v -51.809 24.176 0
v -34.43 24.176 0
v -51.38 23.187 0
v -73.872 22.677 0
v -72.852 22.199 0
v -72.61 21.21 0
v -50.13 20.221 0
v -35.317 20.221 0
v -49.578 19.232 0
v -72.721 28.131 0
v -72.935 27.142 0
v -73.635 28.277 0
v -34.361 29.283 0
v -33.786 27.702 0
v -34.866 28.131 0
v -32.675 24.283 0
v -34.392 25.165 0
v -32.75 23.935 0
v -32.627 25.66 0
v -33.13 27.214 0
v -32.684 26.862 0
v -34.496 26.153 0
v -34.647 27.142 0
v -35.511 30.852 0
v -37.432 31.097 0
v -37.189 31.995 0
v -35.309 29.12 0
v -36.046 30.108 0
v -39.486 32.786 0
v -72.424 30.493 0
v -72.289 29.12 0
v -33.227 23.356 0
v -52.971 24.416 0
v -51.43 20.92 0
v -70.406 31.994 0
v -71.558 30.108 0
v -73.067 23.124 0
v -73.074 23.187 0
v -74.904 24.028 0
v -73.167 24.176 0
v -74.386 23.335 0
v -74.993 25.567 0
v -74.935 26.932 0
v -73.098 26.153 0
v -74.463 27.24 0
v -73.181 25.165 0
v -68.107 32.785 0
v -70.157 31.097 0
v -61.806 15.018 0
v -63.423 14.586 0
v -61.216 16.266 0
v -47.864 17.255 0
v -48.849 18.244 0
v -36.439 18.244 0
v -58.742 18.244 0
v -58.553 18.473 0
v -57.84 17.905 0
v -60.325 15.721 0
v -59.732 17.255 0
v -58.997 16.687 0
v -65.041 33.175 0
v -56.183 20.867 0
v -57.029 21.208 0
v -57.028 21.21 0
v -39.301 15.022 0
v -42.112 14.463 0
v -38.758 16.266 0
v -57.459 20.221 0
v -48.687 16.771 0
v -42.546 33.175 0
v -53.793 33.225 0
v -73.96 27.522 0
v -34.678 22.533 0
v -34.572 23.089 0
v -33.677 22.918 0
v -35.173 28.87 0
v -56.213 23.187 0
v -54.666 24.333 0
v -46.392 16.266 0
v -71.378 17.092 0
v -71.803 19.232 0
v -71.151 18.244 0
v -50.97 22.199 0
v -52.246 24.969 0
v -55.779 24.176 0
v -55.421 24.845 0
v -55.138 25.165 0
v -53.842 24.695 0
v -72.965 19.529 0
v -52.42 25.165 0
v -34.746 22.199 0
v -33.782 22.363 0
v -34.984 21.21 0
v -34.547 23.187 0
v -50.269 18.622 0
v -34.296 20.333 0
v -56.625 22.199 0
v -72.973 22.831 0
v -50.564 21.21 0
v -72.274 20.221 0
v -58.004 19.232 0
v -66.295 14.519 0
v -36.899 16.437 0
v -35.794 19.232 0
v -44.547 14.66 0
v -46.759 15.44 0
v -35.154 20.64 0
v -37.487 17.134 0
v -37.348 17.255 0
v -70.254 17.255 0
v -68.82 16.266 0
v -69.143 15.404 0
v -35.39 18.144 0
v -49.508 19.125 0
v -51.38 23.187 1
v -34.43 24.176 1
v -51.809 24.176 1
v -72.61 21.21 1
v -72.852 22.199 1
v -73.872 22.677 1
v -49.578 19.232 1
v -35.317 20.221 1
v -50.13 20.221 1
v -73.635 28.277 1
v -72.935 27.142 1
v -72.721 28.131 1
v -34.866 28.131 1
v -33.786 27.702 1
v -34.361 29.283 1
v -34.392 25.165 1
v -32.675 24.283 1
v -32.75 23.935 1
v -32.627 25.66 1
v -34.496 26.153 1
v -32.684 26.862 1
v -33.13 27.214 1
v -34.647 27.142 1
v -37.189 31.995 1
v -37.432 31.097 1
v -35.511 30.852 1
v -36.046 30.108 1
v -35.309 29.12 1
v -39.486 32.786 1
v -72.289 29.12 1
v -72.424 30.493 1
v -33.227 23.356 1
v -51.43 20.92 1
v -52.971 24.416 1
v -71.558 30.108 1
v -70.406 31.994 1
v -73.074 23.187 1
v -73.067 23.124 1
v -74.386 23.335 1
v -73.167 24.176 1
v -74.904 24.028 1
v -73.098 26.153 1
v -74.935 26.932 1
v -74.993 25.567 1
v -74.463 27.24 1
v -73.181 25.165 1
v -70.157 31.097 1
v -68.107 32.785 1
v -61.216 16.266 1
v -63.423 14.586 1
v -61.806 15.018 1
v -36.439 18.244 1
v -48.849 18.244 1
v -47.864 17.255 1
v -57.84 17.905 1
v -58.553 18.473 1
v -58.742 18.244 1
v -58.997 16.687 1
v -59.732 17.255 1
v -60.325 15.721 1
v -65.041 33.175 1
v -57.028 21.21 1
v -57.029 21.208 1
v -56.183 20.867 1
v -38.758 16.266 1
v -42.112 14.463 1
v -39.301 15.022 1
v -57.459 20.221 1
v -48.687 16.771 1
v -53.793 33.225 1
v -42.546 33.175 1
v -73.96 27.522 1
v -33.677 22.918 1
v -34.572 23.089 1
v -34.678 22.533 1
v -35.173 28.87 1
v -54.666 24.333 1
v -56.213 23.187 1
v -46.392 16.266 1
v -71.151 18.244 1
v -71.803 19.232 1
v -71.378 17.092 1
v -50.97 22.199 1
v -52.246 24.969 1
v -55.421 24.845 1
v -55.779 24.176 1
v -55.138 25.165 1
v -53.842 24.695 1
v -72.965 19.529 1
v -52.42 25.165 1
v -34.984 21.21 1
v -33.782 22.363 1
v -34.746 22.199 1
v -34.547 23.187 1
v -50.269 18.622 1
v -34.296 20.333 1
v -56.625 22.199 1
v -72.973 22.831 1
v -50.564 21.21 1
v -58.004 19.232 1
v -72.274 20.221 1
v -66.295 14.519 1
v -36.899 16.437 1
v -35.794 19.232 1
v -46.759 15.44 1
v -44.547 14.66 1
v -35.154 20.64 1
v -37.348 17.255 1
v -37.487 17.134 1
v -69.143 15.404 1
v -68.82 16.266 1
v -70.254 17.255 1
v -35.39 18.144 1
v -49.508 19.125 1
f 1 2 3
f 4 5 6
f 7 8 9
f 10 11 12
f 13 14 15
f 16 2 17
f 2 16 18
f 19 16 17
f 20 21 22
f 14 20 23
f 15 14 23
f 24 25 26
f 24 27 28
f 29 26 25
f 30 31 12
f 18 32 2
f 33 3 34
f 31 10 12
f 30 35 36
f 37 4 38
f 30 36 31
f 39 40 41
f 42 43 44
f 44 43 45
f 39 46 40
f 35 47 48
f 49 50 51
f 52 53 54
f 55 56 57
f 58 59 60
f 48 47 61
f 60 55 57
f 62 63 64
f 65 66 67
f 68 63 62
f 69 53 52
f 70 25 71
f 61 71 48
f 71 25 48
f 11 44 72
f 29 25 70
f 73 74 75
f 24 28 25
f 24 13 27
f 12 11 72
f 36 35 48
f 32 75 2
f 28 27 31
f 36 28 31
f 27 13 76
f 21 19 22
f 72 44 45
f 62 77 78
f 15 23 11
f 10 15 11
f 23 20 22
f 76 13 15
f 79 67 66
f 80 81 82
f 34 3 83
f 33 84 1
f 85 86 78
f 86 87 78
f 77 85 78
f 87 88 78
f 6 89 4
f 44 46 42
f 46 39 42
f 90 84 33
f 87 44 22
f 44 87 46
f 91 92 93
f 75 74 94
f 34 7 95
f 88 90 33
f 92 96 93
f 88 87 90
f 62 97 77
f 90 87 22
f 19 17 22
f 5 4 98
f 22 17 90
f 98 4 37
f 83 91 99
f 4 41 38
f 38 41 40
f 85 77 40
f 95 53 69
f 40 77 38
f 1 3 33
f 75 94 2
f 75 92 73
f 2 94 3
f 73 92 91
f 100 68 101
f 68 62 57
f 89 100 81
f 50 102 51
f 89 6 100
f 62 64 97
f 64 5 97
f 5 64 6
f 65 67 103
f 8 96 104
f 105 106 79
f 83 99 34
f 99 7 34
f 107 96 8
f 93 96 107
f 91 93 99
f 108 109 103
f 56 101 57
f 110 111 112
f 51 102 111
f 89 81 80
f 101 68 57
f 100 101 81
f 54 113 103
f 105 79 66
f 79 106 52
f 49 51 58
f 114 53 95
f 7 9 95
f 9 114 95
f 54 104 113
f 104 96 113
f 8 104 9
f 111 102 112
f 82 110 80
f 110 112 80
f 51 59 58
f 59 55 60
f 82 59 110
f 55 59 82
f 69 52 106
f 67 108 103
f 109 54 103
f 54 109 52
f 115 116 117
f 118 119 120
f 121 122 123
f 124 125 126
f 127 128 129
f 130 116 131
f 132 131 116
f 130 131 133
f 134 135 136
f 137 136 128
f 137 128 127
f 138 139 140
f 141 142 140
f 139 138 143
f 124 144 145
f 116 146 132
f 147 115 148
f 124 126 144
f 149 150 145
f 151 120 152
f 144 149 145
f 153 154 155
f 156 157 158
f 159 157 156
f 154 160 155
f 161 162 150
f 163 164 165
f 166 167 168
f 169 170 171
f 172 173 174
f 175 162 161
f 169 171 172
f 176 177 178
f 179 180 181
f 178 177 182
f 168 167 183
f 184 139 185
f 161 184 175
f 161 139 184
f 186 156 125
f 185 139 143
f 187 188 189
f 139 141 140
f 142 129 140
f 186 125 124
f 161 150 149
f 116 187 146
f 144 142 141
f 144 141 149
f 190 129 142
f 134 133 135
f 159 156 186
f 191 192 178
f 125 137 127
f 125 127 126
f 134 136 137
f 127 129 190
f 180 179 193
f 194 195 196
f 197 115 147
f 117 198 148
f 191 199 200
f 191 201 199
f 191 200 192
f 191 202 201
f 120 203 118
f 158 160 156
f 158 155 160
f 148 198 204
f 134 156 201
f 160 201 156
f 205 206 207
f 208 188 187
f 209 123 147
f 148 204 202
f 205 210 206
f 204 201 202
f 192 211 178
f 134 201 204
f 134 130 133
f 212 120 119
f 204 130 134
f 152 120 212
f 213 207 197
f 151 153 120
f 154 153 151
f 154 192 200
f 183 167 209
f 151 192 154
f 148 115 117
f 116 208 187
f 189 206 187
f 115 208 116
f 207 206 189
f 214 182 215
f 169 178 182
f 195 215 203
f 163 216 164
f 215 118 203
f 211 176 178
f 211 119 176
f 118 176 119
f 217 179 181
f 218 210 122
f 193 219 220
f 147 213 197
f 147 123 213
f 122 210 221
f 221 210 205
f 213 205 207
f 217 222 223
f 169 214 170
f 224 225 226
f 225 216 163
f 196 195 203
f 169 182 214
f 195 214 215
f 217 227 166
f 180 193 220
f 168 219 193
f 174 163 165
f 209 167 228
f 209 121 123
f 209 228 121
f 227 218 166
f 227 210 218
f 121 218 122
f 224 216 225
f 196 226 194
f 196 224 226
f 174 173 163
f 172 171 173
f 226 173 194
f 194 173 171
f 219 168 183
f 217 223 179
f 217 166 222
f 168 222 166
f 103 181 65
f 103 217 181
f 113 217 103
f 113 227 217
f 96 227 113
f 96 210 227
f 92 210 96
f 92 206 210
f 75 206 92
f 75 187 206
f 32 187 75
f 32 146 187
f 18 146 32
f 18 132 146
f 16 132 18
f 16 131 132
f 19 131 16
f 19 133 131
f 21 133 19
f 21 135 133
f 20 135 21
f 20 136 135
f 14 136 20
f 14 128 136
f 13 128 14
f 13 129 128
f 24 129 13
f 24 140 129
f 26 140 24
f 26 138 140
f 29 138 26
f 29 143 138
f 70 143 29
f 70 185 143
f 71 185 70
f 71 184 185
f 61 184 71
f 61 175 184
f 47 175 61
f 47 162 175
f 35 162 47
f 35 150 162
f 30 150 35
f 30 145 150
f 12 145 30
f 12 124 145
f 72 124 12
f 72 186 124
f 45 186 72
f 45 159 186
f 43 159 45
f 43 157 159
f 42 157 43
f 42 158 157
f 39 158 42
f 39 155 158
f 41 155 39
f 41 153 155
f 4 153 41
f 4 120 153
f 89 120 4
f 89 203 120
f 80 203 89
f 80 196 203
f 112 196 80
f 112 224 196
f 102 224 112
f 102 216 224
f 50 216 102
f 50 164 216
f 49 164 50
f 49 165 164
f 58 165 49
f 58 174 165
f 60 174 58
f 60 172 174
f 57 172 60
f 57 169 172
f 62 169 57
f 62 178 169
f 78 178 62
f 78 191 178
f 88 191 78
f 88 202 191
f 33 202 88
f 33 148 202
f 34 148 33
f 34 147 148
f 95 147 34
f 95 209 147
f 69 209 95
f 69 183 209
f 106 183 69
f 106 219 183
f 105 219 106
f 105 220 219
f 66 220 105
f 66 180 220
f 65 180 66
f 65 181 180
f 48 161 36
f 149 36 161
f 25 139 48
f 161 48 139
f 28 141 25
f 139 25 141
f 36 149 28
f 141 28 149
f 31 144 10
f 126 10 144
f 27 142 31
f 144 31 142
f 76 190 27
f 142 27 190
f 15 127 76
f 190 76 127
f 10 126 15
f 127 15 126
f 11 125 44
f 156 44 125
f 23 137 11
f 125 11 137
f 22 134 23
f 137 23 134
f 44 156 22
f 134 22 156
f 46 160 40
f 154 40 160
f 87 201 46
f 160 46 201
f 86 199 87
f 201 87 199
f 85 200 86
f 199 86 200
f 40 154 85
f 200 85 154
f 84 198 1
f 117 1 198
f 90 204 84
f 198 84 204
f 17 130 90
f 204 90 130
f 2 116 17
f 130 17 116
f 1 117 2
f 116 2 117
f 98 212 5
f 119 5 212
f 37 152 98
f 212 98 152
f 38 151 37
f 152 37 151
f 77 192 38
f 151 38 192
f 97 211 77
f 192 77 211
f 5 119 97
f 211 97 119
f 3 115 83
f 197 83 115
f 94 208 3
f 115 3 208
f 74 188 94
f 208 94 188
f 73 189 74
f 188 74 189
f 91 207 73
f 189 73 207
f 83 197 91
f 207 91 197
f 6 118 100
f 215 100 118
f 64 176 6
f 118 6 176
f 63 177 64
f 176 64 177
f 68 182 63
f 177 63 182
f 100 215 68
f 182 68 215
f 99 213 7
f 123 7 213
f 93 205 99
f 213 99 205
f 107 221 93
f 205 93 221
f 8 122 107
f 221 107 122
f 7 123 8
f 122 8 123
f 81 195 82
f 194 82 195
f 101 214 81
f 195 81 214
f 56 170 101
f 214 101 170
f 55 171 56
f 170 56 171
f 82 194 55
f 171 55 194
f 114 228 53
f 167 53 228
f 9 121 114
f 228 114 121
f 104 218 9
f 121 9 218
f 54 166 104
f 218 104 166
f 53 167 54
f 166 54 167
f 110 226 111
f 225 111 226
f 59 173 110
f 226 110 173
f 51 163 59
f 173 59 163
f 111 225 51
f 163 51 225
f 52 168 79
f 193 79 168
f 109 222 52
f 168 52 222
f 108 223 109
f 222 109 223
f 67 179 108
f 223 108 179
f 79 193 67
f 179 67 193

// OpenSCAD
$fn=100;
color([0.8000, 0.8000, 0.8000, 1.0000]) linear_extrude(1) path37();

module path37()
    polygon(
        points=
            [[-53.793, 33.225], [-65.041, 33.175], [-68.107, 32.785], [-70.406, 31.994], [-72.424, 30.493], [-73.635, 28.277], [-73.96, 27.522], [-74.463, 27.24], [-74.935, 26.932], [-74.993, 25.567], [-74.904, 24.028], [-74.386, 23.335], [-73.872, 22.677], [-72.965, 19.529], [-71.378, 17.092], [-69.143, 15.404], [-66.295, 14.519], [-63.423, 14.586], [-61.806, 15.018], [-60.325, 15.721], [-58.997, 16.687], [-57.84, 17.905], [-56.183, 20.867], [-54.666, 24.333], [-53.842, 24.695], [-52.971, 24.416], [-51.43, 20.92], [-50.269, 18.622], [-48.687, 16.771], [-46.759, 15.44], [-44.547, 14.66], [-42.112, 14.463], [-39.301, 15.022], [-36.899, 16.437], [-35.39, 18.144], [-34.296, 20.333], [-33.782, 22.363], [-33.677, 22.918], [-33.227, 23.356], [-32.75, 23.935], [-32.675, 24.283], [-32.627, 25.66], [-32.684, 26.862], [-33.13, 27.214], [-33.786, 27.702], [-34.361, 29.283], [-35.511, 30.852], [-37.189, 31.995], [-39.486, 32.786], [-42.546, 33.175], [-70.157, 31.097], [-37.432, 31.097], [-36.046, 30.108], [-71.558, 30.108], [-72.289, 29.12], [-35.309, 29.12], [-35.173, 28.87], [-34.866, 28.131], [-72.721, 28.131], [-72.935, 27.142], [-34.647, 27.142], [-34.496, 26.153], [-73.098, 26.153], [-73.181, 25.165], [-55.138, 25.165], [-55.421, 24.845], [-55.779, 24.176], [-73.167, 24.176], [-52.42, 25.165], [-34.392, 25.165], [-34.43, 24.176], [-51.809, 24.176], [-52.246, 24.969], [-52.42, 25.165], [-73.074, 23.187], [-56.213, 23.187], [-56.625, 22.199], [-72.852, 22.199], [-72.973, 22.831], [-73.067, 23.124], [-51.38, 23.187], [-34.547, 23.187], [-34.572, 23.089], [-34.678, 22.533], [-34.746, 22.199], [-50.97, 22.199], [-72.61, 21.21], [-57.028, 21.21], [-57.029, 21.208], [-57.459, 20.221], [-72.274, 20.221], [-72.61, 21.21], [-50.564, 21.21], [-34.984, 21.21], [-35.154, 20.64], [-35.317, 20.221], [-50.13, 20.221], [-71.803, 19.232], [-58.004, 19.232], [-58.553, 18.473], [-58.742, 18.244], [-71.151, 18.244], [-49.578, 19.232], [-35.794, 19.232], [-36.439, 18.244], [-48.849, 18.244], [-49.508, 19.125], [-70.254, 17.255], [-59.732, 17.255], [-61.216, 16.266], [-68.82, 16.266], [-47.864, 17.255], [-37.348, 17.255], [-37.487, 17.134], [-38.758, 16.266], [-46.392, 16.266]],
        paths=
            [[0, 1, 2, 3, 4, 5, 6, 7, 8, 9, 10, 11, 12, 13, 14, 15, 16, 17, 18, 19, 20, 21, 22, 23, 24, 25, 26, 27, 28, 29, 30, 31, 32, 33, 34, 35, 36, 37, 38, 39, 40, 41, 42, 43, 44, 45, 46, 47, 48, 49, 0, 0], [50, 51, 52, 53, 50, 50], [54, 55, 56, 57, 58, 54, 54], [59, 60, 61, 62, 59, 59], [63, 64, 65, 66, 67, 63, 63], [68, 69, 70, 71, 72, 73, 68], [74, 75, 76, 77, 78, 79, 74, 74], [80, 81, 82, 83, 84, 85, 80, 80], [86, 87, 88, 89, 90, 91, 86], [92, 93, 94, 95, 96, 92, 92], [97, 98, 99, 100, 101, 97, 97], [102, 103, 104, 105, 106, 102, 102], [107, 108, 109, 110, 107, 107], [111, 112, 113, 114, 115, 111, 111]]
    );
